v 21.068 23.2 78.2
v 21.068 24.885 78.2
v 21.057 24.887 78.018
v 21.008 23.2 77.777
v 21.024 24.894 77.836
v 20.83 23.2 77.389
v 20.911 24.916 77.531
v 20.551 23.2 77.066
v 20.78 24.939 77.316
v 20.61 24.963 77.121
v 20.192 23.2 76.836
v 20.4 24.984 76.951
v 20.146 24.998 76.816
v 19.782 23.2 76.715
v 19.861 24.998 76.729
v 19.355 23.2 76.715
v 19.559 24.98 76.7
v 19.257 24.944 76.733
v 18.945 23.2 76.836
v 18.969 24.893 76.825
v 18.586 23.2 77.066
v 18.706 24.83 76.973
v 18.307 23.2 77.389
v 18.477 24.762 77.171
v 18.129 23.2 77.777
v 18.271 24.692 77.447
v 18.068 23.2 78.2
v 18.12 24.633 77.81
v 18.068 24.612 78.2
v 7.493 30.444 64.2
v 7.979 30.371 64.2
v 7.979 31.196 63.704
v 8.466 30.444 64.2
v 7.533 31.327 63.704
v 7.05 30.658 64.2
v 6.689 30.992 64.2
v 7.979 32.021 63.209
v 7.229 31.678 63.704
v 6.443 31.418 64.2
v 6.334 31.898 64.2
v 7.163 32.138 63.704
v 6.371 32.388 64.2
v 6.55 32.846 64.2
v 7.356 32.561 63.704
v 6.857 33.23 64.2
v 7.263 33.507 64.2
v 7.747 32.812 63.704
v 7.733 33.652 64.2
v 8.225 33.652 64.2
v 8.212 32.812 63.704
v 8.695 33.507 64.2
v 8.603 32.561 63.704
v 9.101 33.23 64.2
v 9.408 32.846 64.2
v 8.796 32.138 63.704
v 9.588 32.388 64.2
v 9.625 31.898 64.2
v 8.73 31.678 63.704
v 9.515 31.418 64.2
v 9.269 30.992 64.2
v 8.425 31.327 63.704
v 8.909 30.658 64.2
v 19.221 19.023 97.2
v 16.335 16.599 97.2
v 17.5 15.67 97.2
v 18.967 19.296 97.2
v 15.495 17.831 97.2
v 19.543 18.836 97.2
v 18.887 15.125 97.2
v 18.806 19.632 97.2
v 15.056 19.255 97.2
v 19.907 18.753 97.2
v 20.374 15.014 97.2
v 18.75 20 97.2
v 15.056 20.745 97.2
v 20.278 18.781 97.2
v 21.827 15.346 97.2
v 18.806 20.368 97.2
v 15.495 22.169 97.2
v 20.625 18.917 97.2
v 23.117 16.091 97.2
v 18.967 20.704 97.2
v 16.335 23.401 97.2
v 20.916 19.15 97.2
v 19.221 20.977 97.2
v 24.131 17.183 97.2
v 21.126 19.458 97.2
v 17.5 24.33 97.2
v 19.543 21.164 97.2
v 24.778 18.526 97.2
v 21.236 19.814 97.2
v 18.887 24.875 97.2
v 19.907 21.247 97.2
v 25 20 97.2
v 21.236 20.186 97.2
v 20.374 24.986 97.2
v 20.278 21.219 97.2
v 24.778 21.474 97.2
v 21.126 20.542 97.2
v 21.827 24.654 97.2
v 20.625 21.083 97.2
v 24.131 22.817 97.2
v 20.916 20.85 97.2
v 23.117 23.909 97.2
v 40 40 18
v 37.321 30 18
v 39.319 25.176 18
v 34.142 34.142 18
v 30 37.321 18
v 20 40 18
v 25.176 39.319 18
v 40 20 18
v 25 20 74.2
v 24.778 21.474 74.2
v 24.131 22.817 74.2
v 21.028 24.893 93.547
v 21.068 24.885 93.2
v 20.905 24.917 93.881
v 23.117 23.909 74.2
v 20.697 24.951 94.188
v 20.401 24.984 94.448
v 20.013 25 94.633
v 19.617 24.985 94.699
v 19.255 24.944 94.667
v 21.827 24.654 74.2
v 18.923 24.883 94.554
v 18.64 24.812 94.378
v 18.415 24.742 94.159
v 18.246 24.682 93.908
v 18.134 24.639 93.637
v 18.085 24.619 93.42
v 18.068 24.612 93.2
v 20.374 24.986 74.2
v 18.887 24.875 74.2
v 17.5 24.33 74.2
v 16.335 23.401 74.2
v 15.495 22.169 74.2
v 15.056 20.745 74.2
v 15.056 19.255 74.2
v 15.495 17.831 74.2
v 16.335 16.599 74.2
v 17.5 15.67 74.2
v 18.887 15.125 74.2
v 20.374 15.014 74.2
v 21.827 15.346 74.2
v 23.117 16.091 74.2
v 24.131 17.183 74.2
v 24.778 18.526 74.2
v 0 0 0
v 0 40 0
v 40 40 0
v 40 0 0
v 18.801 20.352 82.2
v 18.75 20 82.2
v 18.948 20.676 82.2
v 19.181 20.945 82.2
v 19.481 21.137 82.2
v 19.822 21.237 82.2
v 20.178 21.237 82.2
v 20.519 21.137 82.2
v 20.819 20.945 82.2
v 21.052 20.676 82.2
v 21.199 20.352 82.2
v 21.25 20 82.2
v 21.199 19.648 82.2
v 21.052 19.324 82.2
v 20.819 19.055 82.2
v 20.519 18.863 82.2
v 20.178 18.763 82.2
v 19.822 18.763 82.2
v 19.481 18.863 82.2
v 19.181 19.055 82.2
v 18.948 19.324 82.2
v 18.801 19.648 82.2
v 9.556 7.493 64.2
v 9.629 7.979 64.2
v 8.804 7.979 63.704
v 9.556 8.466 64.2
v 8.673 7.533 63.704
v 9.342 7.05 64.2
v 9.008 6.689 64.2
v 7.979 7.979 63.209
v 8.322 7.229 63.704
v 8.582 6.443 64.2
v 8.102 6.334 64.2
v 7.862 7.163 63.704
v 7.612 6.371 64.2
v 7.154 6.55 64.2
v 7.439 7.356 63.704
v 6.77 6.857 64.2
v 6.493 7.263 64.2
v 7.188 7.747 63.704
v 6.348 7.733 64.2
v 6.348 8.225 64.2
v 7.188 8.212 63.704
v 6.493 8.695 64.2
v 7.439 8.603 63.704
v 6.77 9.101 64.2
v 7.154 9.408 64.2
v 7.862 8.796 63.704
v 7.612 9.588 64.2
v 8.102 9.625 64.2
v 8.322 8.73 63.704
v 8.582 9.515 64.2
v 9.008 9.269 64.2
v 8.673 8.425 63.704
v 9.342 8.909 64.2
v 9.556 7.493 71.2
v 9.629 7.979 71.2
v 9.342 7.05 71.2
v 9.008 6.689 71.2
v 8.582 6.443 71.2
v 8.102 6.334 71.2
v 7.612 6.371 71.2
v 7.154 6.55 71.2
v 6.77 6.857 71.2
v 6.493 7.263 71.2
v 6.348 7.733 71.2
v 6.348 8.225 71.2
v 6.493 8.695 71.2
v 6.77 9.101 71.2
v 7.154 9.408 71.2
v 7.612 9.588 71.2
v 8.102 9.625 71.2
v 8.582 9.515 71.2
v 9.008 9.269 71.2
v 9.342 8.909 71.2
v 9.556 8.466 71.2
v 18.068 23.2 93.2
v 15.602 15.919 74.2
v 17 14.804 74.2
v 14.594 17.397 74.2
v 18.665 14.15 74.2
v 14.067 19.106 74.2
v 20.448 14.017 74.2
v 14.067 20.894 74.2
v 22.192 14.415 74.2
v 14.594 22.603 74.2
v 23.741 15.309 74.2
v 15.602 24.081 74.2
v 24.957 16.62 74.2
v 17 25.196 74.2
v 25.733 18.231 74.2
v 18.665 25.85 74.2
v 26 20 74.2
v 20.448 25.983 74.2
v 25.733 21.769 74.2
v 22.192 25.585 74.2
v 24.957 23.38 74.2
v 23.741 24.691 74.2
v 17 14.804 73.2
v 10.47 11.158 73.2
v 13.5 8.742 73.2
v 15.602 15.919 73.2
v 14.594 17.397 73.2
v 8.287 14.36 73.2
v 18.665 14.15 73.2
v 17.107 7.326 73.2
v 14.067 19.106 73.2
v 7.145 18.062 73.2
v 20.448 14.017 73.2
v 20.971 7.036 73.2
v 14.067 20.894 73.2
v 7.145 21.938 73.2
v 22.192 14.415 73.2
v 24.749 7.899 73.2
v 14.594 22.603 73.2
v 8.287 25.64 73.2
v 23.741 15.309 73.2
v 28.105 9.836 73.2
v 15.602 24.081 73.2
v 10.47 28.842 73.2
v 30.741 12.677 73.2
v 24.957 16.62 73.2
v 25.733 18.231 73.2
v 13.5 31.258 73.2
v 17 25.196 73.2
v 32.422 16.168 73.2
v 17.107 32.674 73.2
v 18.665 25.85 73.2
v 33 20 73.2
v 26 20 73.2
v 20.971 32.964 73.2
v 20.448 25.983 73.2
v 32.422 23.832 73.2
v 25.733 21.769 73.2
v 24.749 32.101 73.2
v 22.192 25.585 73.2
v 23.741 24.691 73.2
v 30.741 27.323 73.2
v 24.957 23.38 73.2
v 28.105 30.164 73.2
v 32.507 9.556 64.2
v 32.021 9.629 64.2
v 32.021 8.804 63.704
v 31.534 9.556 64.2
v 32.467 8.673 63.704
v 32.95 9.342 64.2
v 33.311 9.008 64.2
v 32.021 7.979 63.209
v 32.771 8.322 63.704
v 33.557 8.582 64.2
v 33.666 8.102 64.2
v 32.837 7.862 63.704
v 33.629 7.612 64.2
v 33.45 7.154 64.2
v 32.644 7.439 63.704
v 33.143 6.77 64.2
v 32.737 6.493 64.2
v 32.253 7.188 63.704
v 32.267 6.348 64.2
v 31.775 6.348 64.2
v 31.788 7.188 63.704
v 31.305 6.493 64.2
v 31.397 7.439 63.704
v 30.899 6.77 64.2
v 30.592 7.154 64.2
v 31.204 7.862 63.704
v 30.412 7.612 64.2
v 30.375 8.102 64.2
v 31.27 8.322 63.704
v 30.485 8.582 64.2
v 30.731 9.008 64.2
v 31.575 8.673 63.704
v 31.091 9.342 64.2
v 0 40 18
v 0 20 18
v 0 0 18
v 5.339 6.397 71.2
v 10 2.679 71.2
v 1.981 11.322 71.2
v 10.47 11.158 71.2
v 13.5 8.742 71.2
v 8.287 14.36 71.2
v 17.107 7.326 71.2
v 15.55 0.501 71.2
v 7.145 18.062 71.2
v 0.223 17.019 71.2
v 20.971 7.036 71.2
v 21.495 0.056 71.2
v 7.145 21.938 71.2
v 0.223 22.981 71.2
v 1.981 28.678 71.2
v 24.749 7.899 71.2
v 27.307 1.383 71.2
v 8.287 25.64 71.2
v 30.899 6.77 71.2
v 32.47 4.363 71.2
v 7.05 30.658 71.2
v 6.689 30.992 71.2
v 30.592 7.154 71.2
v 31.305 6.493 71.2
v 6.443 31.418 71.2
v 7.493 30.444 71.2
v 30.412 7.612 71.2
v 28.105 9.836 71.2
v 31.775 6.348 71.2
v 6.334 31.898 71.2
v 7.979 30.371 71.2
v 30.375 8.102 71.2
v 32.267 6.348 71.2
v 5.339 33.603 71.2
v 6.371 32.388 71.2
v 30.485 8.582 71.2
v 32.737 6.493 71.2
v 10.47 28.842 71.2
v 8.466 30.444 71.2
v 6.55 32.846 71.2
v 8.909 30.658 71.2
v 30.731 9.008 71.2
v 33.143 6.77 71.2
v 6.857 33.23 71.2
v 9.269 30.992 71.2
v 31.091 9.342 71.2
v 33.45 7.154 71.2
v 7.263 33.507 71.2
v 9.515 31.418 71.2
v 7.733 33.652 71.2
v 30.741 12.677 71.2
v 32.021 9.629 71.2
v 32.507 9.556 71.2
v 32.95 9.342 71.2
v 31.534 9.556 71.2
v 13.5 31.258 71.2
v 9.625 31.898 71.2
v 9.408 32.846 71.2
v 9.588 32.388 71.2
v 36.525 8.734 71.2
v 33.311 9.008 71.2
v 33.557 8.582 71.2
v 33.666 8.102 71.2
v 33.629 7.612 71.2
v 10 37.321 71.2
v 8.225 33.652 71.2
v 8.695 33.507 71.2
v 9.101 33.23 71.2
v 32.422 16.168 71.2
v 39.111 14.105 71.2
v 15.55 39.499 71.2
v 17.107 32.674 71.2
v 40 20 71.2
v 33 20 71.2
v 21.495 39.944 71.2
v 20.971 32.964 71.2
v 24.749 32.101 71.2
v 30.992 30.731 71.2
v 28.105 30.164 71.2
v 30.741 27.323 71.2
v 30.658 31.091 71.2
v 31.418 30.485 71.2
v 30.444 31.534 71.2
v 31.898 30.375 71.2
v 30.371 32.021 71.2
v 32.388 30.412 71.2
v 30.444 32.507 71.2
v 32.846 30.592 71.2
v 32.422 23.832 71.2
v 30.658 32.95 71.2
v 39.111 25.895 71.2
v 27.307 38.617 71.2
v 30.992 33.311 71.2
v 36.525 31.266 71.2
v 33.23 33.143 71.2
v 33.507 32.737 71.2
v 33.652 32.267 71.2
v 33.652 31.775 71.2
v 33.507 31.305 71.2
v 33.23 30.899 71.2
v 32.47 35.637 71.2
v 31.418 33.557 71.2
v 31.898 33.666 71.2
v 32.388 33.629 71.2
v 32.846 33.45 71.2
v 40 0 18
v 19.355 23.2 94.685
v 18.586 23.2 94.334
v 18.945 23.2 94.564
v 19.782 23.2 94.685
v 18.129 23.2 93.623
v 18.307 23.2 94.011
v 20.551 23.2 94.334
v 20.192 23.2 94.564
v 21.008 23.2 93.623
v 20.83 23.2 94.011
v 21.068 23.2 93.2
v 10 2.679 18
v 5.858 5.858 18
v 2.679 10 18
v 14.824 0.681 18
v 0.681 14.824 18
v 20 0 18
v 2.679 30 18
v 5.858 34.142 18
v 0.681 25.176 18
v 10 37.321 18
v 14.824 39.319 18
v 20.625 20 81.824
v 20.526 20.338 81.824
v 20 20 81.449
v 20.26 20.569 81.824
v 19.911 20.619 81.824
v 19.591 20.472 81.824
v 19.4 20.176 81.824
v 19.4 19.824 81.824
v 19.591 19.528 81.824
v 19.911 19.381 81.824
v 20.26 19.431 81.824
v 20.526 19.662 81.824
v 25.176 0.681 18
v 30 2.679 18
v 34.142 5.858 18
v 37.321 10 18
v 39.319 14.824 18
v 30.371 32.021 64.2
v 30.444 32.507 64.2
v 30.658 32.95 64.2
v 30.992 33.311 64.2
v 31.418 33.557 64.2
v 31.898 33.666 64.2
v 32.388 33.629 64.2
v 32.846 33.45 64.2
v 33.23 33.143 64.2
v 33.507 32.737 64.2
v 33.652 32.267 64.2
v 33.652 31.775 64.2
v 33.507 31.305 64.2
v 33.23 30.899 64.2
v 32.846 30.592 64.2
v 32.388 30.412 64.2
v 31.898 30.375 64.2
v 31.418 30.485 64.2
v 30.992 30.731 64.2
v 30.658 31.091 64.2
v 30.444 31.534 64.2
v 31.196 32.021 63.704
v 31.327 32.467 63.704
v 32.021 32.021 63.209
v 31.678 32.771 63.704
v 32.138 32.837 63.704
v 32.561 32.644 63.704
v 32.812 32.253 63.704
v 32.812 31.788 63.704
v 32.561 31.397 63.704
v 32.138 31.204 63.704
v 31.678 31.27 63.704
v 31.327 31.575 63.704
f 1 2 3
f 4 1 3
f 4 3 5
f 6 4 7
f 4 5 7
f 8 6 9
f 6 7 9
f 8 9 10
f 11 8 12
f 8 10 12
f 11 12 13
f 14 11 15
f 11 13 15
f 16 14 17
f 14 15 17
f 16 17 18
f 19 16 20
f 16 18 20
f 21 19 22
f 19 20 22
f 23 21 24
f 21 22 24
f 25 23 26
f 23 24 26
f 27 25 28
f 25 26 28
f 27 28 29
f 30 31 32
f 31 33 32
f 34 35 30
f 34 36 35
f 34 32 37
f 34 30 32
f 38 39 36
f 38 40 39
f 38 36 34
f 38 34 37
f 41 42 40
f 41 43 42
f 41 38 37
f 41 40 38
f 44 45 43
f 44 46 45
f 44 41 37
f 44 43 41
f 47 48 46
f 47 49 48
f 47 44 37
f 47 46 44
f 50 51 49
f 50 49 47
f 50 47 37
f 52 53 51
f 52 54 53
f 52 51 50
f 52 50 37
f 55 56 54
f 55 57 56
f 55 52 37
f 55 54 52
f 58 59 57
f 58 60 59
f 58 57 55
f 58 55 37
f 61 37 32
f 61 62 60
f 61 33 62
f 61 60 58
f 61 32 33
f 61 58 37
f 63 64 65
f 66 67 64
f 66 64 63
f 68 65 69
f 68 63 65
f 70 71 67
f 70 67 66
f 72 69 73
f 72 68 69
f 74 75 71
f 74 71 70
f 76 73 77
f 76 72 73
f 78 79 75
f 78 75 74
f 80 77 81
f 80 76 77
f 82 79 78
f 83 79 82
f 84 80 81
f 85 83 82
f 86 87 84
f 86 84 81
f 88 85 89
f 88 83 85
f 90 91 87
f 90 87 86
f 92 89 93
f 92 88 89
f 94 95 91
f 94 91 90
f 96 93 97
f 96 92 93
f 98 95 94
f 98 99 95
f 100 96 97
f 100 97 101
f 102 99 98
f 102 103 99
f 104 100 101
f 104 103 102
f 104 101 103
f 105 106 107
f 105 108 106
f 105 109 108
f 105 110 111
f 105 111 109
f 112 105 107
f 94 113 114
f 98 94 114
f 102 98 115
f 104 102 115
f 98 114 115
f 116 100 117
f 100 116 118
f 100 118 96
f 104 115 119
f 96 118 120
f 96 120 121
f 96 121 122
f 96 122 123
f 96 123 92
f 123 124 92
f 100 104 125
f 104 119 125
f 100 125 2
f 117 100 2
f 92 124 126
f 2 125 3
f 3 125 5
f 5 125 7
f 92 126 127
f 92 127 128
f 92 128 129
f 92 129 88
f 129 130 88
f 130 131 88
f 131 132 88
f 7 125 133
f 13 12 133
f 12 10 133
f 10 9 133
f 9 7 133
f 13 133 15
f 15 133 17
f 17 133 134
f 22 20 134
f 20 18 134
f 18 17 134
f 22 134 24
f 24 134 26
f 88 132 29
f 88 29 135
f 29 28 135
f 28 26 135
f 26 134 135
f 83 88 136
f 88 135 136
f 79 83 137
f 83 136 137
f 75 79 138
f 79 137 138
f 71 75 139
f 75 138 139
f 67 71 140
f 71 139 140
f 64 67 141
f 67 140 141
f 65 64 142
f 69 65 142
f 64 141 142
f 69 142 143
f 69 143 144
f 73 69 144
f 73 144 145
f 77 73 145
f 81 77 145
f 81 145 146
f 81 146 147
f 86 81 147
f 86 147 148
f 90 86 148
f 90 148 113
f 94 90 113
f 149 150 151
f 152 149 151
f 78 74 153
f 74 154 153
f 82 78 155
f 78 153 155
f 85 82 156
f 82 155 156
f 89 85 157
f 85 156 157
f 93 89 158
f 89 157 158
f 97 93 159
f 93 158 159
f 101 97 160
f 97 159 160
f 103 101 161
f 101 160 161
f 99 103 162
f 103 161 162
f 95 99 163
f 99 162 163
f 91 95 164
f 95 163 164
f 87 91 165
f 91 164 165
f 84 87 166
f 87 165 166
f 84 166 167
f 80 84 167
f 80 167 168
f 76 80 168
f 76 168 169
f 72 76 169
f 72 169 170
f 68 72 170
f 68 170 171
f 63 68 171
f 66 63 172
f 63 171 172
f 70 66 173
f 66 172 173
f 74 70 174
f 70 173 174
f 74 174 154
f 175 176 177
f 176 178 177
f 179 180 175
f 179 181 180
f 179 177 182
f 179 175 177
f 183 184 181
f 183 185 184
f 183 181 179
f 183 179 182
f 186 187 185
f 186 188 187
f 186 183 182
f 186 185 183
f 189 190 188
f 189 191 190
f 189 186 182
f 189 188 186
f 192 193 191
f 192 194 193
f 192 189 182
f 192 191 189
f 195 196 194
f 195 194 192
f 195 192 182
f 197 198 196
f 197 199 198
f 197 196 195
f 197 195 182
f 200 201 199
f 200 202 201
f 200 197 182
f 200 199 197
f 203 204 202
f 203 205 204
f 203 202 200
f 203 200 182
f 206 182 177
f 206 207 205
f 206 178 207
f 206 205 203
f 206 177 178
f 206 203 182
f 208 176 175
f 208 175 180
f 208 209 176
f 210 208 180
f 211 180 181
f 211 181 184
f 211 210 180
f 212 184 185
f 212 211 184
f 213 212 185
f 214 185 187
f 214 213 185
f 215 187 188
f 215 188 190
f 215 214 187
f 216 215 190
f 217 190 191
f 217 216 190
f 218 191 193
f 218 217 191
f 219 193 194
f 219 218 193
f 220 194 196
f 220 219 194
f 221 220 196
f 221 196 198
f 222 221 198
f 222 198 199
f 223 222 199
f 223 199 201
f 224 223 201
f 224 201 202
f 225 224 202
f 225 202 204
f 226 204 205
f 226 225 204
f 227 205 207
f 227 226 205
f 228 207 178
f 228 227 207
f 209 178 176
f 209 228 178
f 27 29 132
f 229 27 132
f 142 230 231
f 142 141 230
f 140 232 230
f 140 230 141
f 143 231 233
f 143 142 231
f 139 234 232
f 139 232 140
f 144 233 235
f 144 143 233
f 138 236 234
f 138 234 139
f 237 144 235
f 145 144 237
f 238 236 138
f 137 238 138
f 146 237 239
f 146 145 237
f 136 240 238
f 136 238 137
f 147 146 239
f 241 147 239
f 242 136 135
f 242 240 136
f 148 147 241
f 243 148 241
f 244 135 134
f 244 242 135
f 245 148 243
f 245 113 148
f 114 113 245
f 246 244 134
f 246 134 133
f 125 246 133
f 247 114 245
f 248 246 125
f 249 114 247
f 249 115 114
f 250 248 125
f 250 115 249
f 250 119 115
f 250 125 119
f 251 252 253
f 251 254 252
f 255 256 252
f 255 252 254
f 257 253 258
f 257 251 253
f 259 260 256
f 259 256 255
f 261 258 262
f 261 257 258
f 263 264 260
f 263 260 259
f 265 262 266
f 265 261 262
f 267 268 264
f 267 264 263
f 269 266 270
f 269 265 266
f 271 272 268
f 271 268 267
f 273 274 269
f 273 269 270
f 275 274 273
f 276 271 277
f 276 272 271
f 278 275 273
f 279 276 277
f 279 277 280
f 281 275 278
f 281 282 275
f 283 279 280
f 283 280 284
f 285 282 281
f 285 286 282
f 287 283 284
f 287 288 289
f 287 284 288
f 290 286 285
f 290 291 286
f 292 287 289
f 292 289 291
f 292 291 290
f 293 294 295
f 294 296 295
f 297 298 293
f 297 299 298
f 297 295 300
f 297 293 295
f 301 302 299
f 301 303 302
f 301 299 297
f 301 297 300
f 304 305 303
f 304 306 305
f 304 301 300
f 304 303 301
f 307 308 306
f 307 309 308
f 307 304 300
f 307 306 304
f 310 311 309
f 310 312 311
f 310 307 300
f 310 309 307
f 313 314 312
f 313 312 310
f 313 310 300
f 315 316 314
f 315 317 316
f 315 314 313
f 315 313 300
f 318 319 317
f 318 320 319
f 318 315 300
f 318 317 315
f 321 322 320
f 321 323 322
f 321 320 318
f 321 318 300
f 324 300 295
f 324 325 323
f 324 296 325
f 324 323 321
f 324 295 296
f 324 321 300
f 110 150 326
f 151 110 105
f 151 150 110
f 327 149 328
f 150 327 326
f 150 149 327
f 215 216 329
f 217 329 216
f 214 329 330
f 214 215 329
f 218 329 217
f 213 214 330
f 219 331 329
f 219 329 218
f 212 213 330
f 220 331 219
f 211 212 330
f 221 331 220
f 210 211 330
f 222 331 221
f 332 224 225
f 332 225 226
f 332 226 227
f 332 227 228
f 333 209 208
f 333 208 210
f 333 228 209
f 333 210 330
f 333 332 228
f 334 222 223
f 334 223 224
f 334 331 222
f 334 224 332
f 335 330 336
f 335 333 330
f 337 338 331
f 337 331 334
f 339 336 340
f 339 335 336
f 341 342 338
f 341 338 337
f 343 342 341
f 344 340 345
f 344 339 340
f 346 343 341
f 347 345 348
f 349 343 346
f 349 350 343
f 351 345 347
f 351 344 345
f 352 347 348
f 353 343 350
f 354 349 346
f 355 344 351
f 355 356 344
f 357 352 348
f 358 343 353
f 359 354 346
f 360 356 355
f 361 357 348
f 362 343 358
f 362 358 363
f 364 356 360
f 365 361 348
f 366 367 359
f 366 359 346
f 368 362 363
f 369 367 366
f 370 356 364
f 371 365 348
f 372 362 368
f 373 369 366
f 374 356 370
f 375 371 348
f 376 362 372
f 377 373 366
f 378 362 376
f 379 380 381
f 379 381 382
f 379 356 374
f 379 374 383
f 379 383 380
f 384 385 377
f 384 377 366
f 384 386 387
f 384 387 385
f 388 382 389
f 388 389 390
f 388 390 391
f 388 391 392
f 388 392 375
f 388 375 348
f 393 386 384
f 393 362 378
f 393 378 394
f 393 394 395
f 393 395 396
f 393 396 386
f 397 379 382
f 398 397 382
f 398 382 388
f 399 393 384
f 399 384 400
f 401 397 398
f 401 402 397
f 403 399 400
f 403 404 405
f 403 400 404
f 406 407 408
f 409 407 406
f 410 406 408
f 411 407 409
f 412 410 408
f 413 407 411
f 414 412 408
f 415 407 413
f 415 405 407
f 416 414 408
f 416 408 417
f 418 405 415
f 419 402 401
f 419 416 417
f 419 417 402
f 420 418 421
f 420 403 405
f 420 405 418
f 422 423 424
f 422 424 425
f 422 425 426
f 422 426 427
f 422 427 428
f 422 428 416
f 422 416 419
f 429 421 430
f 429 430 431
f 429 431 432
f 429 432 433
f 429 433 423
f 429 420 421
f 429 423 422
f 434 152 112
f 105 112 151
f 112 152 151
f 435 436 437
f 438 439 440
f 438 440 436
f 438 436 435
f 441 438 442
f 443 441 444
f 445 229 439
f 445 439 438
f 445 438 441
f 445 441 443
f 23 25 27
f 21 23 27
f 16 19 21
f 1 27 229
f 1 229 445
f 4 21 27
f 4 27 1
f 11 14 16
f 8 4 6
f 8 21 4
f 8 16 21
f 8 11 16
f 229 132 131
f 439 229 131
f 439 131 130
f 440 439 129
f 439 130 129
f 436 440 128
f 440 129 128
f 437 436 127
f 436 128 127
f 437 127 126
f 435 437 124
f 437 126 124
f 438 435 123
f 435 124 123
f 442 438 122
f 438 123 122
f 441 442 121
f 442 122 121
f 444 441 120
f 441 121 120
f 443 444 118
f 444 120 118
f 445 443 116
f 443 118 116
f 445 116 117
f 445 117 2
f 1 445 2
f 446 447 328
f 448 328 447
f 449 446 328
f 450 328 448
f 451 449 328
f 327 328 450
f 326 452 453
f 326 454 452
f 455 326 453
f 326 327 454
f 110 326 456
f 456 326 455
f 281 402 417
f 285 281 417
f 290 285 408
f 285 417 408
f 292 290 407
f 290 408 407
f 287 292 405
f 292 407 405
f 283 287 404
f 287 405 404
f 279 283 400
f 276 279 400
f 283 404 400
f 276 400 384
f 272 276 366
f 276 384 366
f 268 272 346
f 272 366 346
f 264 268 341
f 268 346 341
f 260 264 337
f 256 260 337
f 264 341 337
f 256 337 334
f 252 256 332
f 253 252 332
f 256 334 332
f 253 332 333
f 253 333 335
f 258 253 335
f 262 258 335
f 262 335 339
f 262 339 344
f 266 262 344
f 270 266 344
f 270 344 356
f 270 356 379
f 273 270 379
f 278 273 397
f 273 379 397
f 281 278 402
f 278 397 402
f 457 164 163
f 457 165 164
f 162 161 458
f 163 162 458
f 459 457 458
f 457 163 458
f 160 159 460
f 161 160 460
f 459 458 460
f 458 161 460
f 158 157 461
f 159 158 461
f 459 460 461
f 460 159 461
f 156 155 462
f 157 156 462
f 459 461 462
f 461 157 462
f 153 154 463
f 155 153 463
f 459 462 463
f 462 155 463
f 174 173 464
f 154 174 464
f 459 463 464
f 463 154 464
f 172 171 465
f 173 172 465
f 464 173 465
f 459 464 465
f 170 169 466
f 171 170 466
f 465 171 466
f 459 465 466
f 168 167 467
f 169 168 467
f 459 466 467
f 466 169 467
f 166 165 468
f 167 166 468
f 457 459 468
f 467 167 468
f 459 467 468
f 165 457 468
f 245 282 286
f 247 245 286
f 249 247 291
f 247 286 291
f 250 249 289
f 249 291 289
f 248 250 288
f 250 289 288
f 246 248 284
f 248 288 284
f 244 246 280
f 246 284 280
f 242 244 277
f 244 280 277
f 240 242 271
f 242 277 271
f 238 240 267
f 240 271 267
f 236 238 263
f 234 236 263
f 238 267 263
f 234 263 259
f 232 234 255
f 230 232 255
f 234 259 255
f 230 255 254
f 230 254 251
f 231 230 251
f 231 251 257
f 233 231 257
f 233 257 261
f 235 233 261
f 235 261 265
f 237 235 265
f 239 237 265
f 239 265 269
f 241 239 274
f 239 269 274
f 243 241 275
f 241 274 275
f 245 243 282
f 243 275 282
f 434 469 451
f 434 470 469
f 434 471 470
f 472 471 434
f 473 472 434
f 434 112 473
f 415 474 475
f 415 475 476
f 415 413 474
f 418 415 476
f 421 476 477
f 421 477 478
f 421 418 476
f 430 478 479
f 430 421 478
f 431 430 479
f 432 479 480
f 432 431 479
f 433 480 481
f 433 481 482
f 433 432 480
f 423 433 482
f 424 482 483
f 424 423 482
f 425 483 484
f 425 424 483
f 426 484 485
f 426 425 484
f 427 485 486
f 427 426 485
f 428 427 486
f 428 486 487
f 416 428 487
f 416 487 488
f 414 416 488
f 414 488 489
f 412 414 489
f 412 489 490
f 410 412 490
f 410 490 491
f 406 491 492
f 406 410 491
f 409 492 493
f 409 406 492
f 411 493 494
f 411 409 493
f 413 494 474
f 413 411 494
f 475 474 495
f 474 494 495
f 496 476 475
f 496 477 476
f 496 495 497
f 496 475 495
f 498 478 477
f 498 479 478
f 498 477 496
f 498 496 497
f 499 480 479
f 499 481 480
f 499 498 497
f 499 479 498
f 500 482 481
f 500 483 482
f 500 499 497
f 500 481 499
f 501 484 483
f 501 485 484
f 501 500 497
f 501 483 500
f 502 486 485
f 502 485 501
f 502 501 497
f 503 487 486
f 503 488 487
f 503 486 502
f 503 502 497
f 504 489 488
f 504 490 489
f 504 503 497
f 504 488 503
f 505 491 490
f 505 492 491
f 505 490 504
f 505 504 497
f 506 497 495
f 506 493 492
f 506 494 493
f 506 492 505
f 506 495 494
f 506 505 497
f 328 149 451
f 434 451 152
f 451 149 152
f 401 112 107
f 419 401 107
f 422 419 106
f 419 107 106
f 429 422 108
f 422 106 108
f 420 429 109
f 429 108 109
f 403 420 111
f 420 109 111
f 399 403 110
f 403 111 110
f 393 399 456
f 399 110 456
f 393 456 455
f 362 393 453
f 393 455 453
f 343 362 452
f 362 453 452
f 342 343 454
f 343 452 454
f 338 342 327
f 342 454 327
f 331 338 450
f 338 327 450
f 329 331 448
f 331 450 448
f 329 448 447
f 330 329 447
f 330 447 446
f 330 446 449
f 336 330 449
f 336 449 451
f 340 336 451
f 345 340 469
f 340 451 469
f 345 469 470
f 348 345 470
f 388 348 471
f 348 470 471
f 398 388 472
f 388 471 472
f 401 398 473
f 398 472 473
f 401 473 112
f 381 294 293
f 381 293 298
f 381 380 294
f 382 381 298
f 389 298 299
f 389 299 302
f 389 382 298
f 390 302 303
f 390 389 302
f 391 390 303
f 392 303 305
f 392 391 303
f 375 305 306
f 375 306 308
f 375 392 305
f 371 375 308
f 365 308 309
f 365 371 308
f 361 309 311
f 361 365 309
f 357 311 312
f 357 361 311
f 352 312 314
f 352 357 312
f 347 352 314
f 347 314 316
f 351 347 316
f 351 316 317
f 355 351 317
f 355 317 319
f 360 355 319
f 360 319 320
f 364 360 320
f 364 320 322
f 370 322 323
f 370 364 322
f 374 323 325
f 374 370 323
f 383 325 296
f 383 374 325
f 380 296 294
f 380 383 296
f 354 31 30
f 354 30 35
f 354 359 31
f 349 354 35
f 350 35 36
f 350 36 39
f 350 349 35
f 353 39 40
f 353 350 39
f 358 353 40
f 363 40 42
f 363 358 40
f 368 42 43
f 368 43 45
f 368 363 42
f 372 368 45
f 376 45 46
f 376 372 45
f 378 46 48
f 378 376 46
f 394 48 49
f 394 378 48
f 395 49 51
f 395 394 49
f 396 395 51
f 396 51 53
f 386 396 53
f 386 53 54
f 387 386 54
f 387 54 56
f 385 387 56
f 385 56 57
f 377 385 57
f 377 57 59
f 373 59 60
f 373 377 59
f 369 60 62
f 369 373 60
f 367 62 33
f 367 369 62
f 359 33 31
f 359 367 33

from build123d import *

# Parameters (mm, degrees)
SKETCH_1_W               = 40
SKETCH_1_H               = 40
EXTRUDE_1_DEPTH          = 18
SKETCH_2_R               = 20
EXTRUDE_2_DEPTH          = 53.2
SKETCH_3_R               = 13
EXTRUDE_3_DEPTH          = 2
SKETCH_4_R               = 6
EXTRUDE_4_DEPTH          = 1
SKETCH_5_R               = 5
EXTRUDE_5_DEPTH          = 23
CUT_EXTRUDE_1_DEPTH      = 1.8
HOLE_WIZARD_M31_D        = 2.5
HOLE_WIZARD_M31_DEPTH    = 15
HOLE_WIZARD_M31_TIP      = 0.751075774
PATTERN_CIRCULAR_1_COUNT = 4


with BuildPart() as part:
    # Эскиз1 → Бобышка-Вытянуть1 (new body)
    with BuildSketch(Plane.XY):
        with Locations((20, 20)):
            Rectangle(SKETCH_1_W, SKETCH_1_H)
    extrude(amount=EXTRUDE_1_DEPTH)

    # Эскиз2 → Бобышка-Вытянуть2 (add)
    with BuildSketch(Plane.XY.offset(18)):
        with Locations((20, 20)):
            Circle(SKETCH_2_R)
    extrude(amount=EXTRUDE_2_DEPTH)

    # Эскиз3 → Бобышка-Вытянуть3 (add)
    with BuildSketch(Plane.XY.offset(71.2)):
        with Locations((20, 20)):
            Circle(SKETCH_3_R)
    extrude(amount=EXTRUDE_3_DEPTH)

    # Эскиз4 → Бобышка-Вытянуть4 (add)
    with BuildSketch(Plane.XY.offset(73.2)):
        with Locations((20, 20)):
            Circle(SKETCH_4_R)
    extrude(amount=EXTRUDE_4_DEPTH)

    # Эскиз5 → Бобышка-Вытянуть5 (add)
    with BuildSketch(Plane.XY.offset(74.2)):
        with Locations((20, 20)):
            Circle(SKETCH_5_R)
    extrude(amount=EXTRUDE_5_DEPTH)

    # Эскиз9 → Вырез-Вытянуть1 (cut)
    with BuildSketch(Plane(origin=(0, 25, 0), x_dir=(-1, 0, 0), z_dir=(0, -1, 0))):
        with BuildLine():
            Line((-21.068455004, -93.2), (-21.068455004, -78.2))
            ThreePointArc((-21.068455004, -78.2), (-19.568455004, -76.7), (-18.068455004, -78.2))
            Line((-18.068455004, -78.2), (-18.068455004, -93.2))
            ThreePointArc((-18.068455004, -93.2), (-19.568455004, -94.7), (-21.068455004, -93.2))
        make_face()
    extrude(amount=CUT_EXTRUDE_1_DEPTH, mode=Mode.SUBTRACT)

    # Отверстие обработанное метчиком M31
    with Locations(Plane.XY.offset(97.2)):
        with Locations((20, 20)):
            Hole(HOLE_WIZARD_M31_D / 2, depth=HOLE_WIZARD_M31_DEPTH)
            with Locations((0, 0, -(HOLE_WIZARD_M31_DEPTH + HOLE_WIZARD_M31_TIP / 2))):  # 118° drill point
                Cone(0, HOLE_WIZARD_M31_D / 2, HOLE_WIZARD_M31_TIP, mode=Mode.SUBTRACT)

    # Эскиз14 → Отверстие обработанное метчиком M41 (revolve, cut)
    with BuildSketch(Plane(origin=(7.97918472, 32.02081528, 71.2), x_dir=(0, -1, 0), z_dir=(1, 0, 0))):
        Polygon((0, 0), (0, 7.991420021), (1.65, 7), (1.65, 0), align=None)
    hole_wizard_m41 = revolve(axis=Axis((7.97918472, 32.02081528, 77.55), (0, 0, -1)), mode=Mode.SUBTRACT)

    # Круговой массив1: Отверстие обработанное метчиком M41 ×4 about axis
    pattern_circular_1_axis = Axis((20, 20, 0), (0, 0, 1))
    for i in range(1, PATTERN_CIRCULAR_1_COUNT):
        add(hole_wizard_m41.rotate(pattern_circular_1_axis, i * 360 / PATTERN_CIRCULAR_1_COUNT), mode=Mode.SUBTRACT)


solid = part.part
